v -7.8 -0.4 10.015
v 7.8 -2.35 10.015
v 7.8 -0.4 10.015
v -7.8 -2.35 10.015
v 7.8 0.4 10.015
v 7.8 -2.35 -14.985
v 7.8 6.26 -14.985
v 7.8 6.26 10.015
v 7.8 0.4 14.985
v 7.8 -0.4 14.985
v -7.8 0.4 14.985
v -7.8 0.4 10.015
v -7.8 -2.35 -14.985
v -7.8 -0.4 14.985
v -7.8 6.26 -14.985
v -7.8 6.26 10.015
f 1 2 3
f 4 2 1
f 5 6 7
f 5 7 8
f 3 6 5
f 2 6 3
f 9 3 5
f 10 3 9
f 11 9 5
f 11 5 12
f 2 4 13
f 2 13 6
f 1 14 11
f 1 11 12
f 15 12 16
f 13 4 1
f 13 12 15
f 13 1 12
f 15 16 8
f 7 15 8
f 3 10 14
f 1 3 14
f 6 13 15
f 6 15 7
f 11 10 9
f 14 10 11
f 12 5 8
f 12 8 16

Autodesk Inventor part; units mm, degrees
ref_plane "YZ Plane" through (0, 0, 0) normal (1, 0, 0) x (0, 1, 0)
ref_plane "XZ Plane" through (0, 0, 0) normal (0, 1, 0) x (-1, 0, 0)
ref_plane "XY Plane" through (0, 0, 0) normal (0, 0, 1) x (1, 0, 0)
sketch "Sketch1" plane through (0, 0, 0) normal (0, 1, 0) x (-1, 0, 0)
  line L0 (-7.8, 14.985) -> (7.8, 14.985)
  line L1 (7.8, 14.985) -> (7.8, -14.985)
  line L2 (7.8, -14.985) -> (-7.8, -14.985)
  line L3 (-7.8, -14.985) -> (-7.8, 14.985)
  line L4 (-7.8, 14.985) -> (7.8, -14.985) construction
  line L5 (7.8, 14.985) -> (-7.8, -14.985) construction
  point P0 (0, 0)
  dimension "d0" = 15.6
  dimension "d1" = 29.97
extrude "Extrusion1" add sketch "Sketch1" along normal mid plane 0.8
sketch "Sketch2" plane through (0, 0.4, 0) normal (0, 1, 0) x (1, 0, 0)
  line L0 (-7.8, -14.985) -> (7.8, -14.985) projected
  line L1 (7.8, -14.985) -> (7.8, 14.985) projected
  line L2 (7.8, 14.985) -> (-7.8, 14.985) projected
  line L3 (-7.8, 14.985) -> (-7.8, -14.985) projected
  line L4 (7.8, 14.985) -> (-7.8, 14.985) projected
  line L5 (7.8, -14.985) -> (7.8, 14.985) projected
  line L6 (-7.8, 14.985) -> (7.8, 14.985)
  line L7 (7.8, 14.985) -> (7.8, -10.015)
  line L8 (7.8, -10.015) -> (-7.8, -10.015)
  line L9 (-7.8, -10.015) -> (-7.8, 14.985)
  point P0 (0, 0)
  dimension "d4" = 25
extrude "Extrusion2" add sketch "Sketch2" along normal blind 5.86 and the other way blind 2.75 contours L3 L2 L1 L8
properties part number "Module_CO2Sensor-T6713" material "ABS Plastic"
